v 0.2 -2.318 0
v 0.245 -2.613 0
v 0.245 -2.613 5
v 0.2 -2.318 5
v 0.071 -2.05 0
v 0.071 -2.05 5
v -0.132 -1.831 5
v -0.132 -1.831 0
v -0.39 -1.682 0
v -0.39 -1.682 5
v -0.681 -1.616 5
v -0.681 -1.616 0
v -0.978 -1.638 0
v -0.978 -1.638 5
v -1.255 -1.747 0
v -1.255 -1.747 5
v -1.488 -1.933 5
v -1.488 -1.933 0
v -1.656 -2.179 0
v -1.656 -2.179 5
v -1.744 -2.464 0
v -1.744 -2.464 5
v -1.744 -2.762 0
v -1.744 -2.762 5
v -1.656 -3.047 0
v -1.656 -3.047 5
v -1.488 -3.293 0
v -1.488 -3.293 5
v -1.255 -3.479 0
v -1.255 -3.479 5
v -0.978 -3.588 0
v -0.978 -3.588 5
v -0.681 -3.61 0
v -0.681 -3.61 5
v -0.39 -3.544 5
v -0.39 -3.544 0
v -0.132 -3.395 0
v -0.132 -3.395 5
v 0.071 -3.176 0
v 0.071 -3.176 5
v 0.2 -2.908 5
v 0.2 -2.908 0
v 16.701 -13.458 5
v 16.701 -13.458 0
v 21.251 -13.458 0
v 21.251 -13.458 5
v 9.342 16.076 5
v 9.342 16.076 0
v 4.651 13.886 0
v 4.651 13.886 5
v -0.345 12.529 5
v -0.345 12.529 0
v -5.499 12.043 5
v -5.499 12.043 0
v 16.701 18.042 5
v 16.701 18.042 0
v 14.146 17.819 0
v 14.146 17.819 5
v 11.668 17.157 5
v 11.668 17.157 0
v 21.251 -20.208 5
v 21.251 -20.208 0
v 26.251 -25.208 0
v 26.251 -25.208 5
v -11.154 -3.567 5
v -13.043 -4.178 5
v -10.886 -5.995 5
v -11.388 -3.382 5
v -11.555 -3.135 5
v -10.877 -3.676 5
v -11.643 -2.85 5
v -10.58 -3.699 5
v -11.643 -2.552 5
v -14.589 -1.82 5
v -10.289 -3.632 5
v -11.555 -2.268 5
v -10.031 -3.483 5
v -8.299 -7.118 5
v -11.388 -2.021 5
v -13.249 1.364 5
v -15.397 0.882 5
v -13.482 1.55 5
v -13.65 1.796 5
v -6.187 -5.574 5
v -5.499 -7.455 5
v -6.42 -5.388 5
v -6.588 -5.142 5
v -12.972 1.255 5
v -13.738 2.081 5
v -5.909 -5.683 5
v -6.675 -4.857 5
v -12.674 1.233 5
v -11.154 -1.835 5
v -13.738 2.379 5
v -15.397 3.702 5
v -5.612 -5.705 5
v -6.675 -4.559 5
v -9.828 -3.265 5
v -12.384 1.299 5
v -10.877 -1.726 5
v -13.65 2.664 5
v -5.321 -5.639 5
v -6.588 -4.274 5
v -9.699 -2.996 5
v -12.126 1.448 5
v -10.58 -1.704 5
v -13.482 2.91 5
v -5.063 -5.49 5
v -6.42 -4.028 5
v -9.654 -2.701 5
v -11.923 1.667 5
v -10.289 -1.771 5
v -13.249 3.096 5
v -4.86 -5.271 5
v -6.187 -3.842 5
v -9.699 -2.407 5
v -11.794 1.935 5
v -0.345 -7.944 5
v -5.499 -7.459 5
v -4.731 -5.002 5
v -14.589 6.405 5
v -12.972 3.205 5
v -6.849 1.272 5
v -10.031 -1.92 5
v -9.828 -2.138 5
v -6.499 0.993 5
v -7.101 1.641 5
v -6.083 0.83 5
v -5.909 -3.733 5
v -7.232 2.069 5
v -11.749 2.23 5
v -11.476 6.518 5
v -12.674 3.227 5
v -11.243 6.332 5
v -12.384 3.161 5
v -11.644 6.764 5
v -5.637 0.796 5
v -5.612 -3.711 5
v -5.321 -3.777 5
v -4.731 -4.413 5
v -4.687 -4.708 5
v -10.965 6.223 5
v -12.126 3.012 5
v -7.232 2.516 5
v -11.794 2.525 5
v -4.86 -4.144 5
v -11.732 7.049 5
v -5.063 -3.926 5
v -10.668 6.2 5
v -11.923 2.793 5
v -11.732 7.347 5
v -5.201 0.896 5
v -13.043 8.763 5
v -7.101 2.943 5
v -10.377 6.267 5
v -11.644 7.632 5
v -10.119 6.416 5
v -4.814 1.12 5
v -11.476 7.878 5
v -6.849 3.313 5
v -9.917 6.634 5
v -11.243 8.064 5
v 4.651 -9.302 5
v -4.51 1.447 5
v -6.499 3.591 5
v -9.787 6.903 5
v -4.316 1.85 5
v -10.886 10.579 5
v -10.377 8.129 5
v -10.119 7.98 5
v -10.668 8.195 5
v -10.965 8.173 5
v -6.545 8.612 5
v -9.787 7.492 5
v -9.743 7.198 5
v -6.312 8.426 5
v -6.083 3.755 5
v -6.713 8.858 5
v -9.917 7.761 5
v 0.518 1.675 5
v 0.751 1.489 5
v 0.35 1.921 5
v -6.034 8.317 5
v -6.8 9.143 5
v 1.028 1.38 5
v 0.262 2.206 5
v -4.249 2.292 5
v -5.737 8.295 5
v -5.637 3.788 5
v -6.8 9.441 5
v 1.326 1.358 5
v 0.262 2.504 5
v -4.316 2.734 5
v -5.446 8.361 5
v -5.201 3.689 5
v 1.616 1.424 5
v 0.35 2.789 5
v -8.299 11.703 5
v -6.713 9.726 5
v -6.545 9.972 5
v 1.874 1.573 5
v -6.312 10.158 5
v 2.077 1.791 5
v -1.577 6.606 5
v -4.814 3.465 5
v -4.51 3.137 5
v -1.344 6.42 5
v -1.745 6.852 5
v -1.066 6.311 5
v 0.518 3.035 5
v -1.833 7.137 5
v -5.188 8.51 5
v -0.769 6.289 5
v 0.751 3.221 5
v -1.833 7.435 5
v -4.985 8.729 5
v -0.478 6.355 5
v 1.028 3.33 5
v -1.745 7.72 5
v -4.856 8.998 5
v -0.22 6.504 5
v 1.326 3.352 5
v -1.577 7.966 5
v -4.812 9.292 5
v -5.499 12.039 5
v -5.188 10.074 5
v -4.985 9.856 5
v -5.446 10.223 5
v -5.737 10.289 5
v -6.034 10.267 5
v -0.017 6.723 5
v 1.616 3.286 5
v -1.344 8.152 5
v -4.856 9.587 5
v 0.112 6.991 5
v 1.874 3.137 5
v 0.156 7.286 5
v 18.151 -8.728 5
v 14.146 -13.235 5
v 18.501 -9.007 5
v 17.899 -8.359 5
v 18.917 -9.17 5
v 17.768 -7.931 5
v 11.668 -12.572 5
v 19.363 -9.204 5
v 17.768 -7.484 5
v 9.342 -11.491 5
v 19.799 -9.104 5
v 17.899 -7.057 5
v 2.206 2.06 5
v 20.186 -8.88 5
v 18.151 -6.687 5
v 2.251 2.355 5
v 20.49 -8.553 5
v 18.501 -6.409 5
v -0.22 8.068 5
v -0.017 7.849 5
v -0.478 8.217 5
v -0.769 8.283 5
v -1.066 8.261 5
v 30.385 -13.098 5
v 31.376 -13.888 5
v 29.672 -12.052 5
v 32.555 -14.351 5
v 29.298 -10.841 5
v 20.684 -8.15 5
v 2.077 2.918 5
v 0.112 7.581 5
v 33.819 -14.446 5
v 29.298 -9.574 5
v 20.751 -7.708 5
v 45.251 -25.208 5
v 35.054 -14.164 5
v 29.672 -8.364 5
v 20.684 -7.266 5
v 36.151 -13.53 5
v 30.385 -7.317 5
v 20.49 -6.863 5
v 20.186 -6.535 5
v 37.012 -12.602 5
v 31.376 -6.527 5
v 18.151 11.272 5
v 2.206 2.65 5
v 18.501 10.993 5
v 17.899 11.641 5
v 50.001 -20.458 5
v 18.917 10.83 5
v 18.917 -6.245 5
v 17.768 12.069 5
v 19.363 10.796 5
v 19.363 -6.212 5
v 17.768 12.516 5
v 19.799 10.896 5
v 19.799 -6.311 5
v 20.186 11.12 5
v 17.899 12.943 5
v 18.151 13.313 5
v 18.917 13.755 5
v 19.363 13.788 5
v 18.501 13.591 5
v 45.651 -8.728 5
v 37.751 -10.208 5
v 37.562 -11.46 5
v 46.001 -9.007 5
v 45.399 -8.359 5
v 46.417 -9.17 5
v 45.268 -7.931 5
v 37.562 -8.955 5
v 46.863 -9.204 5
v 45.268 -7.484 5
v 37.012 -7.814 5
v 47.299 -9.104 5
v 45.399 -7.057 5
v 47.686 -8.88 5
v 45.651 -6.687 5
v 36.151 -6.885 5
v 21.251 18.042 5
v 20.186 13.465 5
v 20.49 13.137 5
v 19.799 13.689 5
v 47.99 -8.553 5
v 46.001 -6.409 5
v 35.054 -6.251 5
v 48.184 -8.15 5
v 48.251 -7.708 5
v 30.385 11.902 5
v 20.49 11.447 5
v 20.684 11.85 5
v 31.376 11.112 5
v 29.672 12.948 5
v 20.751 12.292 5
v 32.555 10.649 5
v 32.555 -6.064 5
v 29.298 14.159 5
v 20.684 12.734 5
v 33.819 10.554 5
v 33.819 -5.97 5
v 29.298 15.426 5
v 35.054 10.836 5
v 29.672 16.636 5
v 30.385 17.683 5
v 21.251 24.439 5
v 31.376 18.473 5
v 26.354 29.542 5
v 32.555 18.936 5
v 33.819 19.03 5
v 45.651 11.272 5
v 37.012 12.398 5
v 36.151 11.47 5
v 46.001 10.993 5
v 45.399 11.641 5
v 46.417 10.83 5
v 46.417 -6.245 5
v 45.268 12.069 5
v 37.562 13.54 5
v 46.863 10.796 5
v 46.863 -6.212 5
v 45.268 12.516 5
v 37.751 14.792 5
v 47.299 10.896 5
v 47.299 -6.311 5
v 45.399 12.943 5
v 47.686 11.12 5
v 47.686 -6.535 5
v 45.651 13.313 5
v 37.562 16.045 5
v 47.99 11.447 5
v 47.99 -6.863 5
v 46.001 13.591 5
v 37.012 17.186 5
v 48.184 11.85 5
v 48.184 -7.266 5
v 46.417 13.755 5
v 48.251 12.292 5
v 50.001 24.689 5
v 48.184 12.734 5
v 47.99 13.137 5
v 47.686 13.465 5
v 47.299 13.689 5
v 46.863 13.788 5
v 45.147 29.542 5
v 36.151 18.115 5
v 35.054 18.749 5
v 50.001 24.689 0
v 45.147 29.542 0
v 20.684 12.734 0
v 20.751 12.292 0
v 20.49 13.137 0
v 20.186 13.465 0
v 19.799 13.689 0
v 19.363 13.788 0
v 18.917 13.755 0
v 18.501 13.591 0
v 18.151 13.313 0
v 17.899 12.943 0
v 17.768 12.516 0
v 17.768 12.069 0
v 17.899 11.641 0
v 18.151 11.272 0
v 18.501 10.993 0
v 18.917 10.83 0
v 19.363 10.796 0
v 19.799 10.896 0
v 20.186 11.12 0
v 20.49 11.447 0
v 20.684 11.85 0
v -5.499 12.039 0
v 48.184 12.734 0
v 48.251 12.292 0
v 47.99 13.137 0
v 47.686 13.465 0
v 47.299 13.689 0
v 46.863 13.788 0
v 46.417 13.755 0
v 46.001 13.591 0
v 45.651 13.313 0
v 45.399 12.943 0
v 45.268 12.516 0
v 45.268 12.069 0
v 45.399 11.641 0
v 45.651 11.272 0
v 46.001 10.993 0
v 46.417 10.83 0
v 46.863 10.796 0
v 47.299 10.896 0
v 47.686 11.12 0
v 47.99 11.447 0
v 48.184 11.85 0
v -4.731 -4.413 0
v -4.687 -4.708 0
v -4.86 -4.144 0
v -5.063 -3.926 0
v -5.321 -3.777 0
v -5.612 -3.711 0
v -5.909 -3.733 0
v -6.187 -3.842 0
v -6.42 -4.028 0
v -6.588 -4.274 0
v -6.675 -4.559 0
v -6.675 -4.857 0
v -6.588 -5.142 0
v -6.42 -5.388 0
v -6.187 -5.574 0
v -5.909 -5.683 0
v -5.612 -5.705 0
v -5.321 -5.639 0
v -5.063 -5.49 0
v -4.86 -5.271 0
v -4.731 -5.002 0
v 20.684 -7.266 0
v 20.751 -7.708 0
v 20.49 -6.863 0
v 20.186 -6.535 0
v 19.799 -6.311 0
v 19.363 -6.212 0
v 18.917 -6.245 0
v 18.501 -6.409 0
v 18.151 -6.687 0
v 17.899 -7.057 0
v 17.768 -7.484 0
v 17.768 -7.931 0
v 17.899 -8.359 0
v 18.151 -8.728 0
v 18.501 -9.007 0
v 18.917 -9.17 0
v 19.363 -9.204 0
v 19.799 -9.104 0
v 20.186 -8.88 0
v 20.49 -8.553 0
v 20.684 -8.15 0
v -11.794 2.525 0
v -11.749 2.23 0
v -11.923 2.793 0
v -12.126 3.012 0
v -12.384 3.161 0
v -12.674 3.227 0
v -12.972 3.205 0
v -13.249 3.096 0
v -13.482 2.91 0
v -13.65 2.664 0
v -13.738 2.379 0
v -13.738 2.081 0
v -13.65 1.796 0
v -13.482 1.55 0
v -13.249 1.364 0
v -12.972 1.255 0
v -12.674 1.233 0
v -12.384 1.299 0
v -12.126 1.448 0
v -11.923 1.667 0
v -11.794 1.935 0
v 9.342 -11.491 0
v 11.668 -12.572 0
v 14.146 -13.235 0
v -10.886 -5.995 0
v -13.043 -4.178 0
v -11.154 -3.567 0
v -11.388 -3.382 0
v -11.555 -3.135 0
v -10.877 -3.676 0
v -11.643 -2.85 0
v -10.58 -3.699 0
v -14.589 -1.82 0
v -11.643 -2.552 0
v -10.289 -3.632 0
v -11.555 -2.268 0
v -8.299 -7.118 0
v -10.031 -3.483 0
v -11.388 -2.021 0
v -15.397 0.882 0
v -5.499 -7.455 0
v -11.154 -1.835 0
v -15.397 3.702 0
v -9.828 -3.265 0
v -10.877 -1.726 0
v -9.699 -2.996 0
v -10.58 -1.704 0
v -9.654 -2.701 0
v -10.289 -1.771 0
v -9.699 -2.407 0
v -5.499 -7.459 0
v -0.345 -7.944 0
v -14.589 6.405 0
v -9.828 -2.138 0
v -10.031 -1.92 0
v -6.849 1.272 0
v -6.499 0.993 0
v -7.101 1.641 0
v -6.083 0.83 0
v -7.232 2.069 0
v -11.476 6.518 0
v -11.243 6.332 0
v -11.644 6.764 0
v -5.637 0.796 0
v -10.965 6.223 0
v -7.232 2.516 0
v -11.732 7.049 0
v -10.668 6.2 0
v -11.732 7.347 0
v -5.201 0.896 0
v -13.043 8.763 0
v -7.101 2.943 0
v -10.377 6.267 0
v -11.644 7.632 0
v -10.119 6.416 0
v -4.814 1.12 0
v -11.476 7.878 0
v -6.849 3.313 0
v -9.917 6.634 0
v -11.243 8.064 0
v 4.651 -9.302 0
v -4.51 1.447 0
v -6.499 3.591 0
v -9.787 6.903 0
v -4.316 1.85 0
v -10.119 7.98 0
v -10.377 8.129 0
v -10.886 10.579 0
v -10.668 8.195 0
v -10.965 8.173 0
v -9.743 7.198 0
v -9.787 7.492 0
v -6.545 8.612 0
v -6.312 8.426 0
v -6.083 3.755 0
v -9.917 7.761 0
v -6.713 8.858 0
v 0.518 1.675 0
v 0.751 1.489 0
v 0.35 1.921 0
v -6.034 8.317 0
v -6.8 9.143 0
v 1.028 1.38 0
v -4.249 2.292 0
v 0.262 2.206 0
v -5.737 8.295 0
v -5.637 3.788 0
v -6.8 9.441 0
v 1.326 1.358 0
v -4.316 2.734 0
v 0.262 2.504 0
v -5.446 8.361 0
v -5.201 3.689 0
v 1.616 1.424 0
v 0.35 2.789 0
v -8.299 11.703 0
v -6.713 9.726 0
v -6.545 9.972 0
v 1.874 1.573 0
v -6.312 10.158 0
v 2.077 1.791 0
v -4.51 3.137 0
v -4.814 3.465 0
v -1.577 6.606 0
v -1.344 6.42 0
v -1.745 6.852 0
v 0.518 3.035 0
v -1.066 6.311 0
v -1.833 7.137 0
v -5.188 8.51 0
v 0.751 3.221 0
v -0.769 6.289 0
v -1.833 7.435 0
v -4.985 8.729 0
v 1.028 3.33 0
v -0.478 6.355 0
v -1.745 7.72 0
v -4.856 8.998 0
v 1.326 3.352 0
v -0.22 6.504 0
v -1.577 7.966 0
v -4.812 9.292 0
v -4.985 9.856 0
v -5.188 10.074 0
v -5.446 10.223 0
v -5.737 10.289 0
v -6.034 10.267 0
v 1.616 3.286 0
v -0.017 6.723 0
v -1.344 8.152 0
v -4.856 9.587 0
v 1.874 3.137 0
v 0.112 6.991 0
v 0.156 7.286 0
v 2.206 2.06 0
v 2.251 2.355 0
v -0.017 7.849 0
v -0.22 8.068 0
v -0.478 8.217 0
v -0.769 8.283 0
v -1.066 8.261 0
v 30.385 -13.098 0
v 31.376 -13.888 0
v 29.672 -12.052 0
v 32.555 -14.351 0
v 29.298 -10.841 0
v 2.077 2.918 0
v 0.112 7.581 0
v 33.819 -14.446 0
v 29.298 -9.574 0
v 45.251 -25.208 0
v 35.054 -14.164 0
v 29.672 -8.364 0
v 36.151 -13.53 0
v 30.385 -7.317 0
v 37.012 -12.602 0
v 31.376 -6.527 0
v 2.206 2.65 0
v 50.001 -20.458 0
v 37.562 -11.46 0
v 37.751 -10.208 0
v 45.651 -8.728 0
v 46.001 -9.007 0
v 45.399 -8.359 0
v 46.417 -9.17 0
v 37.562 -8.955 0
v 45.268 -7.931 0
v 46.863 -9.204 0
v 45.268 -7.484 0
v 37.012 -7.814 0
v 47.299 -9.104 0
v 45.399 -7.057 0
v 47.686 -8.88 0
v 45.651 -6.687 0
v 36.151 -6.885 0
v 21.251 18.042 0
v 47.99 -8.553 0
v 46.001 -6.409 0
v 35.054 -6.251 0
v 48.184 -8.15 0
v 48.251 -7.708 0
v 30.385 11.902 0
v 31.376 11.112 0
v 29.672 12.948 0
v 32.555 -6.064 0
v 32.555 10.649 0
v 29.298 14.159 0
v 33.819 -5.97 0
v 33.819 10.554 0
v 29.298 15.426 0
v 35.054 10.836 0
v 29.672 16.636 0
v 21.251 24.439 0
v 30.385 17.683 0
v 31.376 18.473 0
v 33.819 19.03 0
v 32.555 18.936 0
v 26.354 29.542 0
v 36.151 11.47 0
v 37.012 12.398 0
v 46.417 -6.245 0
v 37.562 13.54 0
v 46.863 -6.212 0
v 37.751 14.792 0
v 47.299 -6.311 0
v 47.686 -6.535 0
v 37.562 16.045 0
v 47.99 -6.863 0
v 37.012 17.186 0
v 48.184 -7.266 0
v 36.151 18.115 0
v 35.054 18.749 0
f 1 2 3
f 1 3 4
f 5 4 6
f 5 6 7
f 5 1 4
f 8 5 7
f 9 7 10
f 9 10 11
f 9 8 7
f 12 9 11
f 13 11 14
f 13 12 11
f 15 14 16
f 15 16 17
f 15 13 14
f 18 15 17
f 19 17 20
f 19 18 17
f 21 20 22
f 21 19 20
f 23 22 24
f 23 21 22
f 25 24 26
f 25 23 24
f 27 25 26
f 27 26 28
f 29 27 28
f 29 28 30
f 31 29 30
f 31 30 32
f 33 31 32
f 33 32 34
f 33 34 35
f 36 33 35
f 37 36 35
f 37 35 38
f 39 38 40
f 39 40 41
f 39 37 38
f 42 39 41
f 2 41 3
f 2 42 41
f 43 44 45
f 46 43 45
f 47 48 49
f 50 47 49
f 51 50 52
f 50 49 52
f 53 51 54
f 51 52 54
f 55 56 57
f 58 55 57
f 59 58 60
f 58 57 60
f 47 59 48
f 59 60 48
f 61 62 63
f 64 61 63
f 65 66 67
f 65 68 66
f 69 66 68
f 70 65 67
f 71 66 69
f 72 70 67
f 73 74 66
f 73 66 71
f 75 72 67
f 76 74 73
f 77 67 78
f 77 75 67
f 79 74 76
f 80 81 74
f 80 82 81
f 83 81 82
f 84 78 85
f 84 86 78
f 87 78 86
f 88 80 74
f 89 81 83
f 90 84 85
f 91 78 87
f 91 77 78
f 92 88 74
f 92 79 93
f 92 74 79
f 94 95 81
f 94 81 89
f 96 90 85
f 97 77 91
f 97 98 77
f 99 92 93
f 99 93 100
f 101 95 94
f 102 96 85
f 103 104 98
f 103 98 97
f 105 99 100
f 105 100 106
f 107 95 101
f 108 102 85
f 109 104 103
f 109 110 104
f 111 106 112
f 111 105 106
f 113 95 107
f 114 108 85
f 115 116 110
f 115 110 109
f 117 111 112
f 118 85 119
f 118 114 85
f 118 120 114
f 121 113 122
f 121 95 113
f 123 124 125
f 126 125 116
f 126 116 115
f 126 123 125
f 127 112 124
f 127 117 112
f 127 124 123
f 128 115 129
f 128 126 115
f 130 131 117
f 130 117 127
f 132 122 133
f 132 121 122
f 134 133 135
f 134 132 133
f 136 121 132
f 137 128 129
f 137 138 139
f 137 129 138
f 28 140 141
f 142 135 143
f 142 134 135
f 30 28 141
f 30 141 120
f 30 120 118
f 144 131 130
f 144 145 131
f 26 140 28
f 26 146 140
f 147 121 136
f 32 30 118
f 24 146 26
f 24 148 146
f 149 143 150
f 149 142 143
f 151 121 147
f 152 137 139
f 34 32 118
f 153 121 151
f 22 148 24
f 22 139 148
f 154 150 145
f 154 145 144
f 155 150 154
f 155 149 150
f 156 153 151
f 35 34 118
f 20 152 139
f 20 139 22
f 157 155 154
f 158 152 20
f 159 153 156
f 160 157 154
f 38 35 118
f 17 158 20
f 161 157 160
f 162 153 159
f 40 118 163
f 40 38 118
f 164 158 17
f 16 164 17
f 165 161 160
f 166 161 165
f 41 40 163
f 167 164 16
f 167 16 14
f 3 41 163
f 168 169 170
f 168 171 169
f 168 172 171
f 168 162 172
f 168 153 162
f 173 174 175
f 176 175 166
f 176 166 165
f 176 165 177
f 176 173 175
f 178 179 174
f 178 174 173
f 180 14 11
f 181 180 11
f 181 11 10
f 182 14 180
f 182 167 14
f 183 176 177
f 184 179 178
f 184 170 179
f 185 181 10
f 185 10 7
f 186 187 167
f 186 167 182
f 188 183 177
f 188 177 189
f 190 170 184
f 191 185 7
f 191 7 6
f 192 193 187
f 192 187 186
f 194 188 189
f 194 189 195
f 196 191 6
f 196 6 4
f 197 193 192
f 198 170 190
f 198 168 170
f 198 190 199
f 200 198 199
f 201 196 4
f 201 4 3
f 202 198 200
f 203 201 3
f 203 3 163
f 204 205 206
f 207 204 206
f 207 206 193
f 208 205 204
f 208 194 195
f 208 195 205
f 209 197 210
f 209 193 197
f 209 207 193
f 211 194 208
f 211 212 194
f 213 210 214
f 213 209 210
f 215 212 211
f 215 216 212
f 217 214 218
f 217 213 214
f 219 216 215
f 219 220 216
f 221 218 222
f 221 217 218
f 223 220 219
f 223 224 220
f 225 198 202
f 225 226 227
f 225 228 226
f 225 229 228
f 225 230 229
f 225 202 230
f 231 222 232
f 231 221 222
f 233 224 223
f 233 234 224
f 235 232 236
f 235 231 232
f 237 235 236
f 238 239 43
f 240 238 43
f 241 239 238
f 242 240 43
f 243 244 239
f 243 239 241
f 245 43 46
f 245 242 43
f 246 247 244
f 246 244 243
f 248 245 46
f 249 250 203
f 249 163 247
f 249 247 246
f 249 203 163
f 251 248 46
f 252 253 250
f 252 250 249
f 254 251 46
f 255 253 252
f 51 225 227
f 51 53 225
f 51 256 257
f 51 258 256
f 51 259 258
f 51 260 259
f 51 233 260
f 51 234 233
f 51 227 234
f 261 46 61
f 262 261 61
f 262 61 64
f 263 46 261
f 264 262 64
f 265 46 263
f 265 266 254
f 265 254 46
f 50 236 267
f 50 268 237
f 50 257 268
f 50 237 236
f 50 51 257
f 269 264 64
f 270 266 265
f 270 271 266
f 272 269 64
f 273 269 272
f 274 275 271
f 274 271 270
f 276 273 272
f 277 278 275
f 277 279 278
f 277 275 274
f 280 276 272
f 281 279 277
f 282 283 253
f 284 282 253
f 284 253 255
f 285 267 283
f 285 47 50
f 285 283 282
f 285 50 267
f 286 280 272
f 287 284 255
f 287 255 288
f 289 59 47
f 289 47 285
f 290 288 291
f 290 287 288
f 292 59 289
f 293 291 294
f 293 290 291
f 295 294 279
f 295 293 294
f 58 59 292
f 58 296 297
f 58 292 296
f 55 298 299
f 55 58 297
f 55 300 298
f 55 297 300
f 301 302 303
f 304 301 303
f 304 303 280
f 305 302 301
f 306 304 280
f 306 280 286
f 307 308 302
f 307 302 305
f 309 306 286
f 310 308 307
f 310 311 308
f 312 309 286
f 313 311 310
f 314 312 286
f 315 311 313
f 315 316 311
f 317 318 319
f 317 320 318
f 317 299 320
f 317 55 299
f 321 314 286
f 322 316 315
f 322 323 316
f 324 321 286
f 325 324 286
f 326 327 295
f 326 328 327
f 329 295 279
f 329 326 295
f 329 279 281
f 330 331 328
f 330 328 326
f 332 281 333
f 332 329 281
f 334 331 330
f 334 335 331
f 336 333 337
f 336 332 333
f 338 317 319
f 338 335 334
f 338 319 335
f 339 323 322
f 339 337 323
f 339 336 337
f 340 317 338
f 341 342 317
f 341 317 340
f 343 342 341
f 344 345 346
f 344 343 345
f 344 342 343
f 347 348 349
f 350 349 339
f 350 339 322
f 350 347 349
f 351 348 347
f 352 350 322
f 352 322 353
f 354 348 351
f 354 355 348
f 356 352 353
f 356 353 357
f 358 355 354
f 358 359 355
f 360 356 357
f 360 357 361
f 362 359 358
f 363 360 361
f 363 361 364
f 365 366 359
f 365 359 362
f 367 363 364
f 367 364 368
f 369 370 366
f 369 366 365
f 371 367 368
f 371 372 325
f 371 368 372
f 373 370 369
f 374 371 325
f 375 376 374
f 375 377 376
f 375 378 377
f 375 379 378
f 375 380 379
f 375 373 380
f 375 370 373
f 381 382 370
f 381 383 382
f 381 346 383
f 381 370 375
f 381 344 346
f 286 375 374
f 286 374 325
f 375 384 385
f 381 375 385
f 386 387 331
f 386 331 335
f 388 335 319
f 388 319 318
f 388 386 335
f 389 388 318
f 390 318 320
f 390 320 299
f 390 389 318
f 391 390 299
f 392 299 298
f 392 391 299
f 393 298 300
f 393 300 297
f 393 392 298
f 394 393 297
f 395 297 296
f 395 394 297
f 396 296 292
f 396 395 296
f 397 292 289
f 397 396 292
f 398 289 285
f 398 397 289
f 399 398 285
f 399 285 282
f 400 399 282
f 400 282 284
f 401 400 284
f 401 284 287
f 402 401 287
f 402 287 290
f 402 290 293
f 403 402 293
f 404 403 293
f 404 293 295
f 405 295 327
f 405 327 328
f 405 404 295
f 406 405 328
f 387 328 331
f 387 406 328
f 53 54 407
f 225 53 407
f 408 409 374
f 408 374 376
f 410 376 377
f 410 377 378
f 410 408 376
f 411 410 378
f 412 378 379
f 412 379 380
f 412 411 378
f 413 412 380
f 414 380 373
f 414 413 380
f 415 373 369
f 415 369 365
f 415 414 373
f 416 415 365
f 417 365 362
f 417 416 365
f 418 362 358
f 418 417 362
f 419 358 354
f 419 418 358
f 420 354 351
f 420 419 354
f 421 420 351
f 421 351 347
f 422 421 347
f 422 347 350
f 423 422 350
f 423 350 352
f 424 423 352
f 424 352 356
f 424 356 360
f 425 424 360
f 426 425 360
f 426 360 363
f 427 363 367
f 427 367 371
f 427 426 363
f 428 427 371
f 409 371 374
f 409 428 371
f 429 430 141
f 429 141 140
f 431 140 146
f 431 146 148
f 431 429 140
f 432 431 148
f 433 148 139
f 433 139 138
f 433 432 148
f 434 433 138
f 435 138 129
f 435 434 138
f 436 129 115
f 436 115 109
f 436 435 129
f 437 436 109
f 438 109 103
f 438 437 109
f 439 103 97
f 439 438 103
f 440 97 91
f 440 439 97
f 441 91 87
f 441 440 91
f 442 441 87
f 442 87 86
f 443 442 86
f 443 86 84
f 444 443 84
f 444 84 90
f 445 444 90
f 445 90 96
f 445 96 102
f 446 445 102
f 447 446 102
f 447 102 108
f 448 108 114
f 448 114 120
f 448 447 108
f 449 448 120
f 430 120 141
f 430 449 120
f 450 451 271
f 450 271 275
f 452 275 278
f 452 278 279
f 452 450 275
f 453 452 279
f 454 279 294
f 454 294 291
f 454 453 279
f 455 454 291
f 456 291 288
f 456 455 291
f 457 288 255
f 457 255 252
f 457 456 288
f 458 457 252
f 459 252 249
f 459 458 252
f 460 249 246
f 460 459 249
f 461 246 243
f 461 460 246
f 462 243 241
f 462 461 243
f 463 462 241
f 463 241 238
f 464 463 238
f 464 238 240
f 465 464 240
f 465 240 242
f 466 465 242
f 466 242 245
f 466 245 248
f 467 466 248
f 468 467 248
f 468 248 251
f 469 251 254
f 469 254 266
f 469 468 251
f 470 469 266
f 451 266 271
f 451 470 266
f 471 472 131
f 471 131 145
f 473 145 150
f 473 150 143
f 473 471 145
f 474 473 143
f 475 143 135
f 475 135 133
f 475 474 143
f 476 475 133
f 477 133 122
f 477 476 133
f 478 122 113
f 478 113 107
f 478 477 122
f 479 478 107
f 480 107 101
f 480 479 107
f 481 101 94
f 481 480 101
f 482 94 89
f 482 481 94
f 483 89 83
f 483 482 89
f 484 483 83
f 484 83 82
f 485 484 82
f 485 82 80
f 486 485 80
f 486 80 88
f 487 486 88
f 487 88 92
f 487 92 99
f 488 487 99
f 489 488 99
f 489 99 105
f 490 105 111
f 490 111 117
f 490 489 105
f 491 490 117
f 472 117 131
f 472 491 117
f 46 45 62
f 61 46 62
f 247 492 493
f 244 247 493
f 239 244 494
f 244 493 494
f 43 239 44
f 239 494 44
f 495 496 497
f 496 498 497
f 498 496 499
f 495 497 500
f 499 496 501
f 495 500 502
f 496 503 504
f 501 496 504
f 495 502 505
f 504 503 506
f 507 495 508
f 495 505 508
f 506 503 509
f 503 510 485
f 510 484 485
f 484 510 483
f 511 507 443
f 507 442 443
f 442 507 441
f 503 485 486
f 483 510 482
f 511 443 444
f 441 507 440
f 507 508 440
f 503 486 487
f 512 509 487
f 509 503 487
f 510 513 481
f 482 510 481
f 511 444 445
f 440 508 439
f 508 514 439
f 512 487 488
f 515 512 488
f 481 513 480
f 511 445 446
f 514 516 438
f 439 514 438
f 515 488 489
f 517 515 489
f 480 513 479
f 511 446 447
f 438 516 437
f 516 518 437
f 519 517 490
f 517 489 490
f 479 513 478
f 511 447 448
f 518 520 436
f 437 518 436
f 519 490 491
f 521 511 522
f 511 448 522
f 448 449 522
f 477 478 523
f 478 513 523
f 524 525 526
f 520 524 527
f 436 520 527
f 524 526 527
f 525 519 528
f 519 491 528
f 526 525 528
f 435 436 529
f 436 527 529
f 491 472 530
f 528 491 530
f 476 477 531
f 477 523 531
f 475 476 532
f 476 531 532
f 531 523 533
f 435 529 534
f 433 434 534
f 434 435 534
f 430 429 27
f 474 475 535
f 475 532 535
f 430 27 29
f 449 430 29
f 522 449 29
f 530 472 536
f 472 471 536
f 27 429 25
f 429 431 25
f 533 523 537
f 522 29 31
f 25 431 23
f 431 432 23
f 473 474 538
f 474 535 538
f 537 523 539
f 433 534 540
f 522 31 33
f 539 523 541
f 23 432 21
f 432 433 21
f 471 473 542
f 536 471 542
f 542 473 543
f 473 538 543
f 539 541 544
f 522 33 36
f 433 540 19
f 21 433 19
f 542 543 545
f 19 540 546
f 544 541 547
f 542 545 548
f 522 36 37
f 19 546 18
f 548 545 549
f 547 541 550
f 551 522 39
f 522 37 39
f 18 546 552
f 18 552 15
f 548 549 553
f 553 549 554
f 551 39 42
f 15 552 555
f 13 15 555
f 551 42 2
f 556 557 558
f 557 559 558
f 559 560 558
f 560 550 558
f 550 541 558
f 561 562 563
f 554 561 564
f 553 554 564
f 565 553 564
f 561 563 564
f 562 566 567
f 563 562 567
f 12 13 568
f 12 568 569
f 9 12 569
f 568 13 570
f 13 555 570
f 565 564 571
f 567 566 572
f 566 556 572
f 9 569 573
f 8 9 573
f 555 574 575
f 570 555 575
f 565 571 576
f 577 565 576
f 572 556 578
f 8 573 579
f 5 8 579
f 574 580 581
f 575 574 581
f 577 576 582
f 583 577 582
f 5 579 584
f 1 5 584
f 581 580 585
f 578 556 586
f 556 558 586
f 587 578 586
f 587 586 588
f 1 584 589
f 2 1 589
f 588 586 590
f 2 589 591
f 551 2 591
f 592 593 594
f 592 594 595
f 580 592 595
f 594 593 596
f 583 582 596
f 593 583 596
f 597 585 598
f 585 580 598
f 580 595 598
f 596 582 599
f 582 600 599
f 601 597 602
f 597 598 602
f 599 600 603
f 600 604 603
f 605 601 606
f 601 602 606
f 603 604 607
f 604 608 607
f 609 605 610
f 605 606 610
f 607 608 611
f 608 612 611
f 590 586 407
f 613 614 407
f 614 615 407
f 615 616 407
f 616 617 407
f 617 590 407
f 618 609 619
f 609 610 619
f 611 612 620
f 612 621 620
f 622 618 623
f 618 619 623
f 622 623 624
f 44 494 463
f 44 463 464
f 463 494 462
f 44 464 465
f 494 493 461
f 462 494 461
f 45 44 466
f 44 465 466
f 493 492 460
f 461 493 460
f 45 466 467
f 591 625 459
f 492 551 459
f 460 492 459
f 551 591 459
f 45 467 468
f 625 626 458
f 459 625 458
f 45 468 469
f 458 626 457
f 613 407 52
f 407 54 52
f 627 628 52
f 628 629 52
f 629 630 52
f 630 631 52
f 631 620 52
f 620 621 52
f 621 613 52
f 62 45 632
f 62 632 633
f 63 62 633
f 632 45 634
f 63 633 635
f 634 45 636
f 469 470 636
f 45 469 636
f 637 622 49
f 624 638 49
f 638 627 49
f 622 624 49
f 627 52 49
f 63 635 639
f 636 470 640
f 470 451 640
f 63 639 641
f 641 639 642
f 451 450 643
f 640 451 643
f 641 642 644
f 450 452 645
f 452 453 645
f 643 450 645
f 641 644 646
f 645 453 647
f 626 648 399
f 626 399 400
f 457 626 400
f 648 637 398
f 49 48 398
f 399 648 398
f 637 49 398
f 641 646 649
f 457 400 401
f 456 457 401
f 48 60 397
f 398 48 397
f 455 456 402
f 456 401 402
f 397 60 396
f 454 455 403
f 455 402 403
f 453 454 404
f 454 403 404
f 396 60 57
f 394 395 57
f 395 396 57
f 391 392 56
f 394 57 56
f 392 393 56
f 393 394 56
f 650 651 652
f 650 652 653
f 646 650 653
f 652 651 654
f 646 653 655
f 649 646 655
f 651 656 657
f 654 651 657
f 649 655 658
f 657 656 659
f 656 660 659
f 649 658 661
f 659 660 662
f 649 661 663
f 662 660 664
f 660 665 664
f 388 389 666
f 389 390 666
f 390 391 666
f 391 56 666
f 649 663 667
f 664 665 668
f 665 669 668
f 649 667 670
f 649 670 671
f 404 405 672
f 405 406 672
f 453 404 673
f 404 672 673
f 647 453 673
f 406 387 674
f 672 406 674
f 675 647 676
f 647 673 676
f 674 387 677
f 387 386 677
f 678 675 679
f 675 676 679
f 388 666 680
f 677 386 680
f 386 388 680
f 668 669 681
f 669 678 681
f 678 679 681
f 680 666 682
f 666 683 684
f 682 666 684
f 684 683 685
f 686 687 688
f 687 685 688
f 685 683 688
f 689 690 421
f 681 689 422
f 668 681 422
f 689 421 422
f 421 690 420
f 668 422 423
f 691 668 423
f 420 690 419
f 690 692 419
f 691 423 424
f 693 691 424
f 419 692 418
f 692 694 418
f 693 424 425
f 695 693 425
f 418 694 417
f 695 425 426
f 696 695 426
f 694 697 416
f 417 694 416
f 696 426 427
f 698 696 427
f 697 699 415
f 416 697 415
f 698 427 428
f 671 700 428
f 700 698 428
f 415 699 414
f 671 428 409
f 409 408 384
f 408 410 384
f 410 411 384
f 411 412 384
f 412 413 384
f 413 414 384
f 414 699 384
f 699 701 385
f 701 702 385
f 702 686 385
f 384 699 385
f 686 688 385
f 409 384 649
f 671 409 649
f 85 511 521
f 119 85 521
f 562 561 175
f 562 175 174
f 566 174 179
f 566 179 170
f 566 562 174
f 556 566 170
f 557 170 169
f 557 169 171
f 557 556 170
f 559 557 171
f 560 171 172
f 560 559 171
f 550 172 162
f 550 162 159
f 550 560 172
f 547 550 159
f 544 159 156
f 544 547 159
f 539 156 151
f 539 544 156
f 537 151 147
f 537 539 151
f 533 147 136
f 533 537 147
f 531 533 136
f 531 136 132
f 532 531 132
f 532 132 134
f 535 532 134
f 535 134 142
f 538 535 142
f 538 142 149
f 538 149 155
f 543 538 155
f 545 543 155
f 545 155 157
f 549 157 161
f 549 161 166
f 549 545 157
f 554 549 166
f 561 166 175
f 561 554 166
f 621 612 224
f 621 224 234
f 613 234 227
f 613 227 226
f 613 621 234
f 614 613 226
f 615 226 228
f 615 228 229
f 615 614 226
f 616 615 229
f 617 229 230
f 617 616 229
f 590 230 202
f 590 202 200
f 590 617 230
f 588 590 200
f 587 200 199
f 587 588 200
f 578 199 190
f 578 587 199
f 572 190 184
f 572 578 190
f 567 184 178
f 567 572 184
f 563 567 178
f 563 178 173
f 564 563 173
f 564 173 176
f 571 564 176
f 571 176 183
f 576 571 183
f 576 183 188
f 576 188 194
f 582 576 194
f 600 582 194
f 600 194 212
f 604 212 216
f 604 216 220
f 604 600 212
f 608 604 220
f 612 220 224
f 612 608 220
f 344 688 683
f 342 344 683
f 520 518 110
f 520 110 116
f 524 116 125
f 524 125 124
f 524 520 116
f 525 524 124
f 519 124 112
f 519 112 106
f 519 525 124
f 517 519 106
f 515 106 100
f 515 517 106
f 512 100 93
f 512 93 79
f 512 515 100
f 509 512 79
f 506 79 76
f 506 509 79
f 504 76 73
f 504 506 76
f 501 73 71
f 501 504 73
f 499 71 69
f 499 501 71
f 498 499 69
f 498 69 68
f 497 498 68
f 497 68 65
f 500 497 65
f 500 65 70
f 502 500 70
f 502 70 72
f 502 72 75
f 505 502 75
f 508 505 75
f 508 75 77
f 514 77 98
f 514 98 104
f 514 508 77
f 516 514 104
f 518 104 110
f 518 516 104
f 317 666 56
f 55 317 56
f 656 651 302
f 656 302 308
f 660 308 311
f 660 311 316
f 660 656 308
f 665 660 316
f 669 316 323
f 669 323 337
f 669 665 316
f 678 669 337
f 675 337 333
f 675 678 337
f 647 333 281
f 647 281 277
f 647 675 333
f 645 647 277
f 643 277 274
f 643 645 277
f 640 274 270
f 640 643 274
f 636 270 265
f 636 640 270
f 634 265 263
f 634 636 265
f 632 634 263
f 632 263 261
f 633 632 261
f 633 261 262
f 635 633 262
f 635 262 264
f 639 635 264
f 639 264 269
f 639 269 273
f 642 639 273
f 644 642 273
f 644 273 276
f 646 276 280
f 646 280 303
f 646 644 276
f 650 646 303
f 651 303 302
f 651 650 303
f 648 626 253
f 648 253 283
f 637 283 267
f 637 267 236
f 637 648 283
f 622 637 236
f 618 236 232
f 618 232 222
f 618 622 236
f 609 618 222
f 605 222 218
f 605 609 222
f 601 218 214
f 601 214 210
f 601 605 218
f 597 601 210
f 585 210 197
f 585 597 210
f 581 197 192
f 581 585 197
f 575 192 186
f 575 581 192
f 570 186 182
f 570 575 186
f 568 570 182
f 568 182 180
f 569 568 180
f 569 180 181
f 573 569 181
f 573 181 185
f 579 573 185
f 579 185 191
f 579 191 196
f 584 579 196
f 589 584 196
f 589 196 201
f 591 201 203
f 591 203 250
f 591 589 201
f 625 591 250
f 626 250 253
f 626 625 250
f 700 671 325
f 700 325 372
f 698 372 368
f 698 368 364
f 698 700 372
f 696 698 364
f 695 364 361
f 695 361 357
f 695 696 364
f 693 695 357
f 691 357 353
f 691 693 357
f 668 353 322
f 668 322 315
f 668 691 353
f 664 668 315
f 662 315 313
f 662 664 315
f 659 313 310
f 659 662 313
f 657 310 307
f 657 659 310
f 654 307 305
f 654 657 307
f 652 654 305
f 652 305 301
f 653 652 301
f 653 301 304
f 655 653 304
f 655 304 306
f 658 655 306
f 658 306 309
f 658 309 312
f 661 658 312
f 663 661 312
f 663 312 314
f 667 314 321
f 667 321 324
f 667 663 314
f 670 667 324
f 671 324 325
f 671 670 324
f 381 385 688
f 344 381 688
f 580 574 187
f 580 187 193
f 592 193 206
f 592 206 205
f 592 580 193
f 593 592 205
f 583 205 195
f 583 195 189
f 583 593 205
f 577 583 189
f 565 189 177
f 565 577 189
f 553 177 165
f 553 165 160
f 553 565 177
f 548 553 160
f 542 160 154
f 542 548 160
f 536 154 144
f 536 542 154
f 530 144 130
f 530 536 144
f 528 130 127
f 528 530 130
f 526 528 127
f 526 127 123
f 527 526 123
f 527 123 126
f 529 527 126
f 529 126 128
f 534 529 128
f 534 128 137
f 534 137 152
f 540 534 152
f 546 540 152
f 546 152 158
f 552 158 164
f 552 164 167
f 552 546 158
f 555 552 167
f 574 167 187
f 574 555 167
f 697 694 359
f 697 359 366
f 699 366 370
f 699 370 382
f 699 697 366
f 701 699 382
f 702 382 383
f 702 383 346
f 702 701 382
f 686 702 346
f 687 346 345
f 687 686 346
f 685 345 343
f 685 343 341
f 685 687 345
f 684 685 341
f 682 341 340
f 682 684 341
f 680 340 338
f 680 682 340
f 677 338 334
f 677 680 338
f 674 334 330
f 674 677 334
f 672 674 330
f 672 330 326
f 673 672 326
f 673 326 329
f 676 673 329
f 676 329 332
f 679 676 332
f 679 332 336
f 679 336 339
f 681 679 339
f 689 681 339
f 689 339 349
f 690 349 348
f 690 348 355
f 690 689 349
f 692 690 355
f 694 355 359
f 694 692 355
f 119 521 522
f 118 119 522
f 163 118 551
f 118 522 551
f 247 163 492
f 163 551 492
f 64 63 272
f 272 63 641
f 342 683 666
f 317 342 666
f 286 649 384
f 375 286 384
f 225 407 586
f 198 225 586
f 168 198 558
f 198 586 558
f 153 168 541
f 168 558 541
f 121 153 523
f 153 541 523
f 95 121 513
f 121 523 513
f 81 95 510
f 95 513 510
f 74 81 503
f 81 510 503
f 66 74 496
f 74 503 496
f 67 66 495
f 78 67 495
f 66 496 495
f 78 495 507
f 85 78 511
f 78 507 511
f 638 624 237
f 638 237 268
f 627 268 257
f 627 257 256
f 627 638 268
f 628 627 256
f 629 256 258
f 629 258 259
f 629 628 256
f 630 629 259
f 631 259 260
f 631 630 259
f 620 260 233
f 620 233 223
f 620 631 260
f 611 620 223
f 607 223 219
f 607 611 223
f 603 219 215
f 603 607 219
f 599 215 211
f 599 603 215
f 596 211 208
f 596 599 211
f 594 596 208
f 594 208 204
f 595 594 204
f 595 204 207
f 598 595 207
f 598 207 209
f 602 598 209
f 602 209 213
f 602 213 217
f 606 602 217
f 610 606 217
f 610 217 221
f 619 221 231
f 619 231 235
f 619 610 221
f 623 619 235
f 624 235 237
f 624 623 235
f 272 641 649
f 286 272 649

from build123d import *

# Parameters (mm, degrees)
SKETCH1_R           = 1.5
SKETCH1_R_2         = 4.25
SKETCH1_R_3         = 1
BOSS_EXTRUDE2_DEPTH = 5


with BuildPart() as part:
    # Sketch1 → Boss-Extrude2 (new body)
    with BuildSketch(Plane.XY):
        with BuildLine():
            Line((45.25091594, -25.207708346), (50.00091594, -20.457708346))
            Line((50.00091594, -20.457708346), (50.00091594, 24.688738263))
            Line((50.00091594, 24.688738263), (45.147362549, 29.542291654))
            Line((45.147362549, 29.542291654), (26.35446933, 29.542291654))
            Line((26.35446933, 29.542291654), (21.25091594, 24.438738263))
            Line((21.25091594, 24.438738263), (21.25091594, 18.042291654))
            Line((21.25091594, 18.042291654), (20.408095363, 18.042291654))
            Line((20.408095363, 18.042291654), (16.70086026, 18.042291654))
            ThreePointArc((16.70086026, 18.042291654), (12.892426636, 17.542145454), (9.3422674, 16.075624987))
            ThreePointArc((9.3422674, 16.075624987), (2.182128173, 13.100539865), (-5.49908406, 12.043324729))
            Line((-5.49908406, 12.043324729), (-5.49908406, 12.039085999))
            ThreePointArc((-5.49908406, 12.039085999), (-15.49908406, 2.292291654), (-5.49908406, -7.454502691))
            Line((-5.49908406, -7.454502691), (-5.49908406, -7.458741422))
            ThreePointArc((-5.49908406, -7.458741422), (2.182128173, -8.515956557), (9.3422674, -11.491041679))
            ThreePointArc((9.3422674, -11.491041679), (12.892426636, -12.957562146), (16.70086026, -13.457708346))
            Line((16.70086026, -13.457708346), (20.408095363, -13.457708346))
            Line((20.408095363, -13.457708346), (21.25091594, -13.457708346))
            Line((21.25091594, -13.457708346), (21.25091594, -20.207708346))
            Line((21.25091594, -20.207708346), (26.25091594, -25.207708346))
            Line((26.25091594, -25.207708346), (45.25091594, -25.207708346))
        make_face()
        with Locations((46.75091594, -7.707708346)):
            Circle(SKETCH1_R, mode=Mode.SUBTRACT)
        with Locations((46.75091594, 12.292291654)):
            Circle(SKETCH1_R, mode=Mode.SUBTRACT)
        with Locations((33.50091594, 14.792291654)):
            Circle(SKETCH1_R_2, mode=Mode.SUBTRACT)
        with Locations((33.50091594, -10.207708346)):
            Circle(SKETCH1_R_2, mode=Mode.SUBTRACT)
        with Locations((19.25091594, 12.292291654)):
            Circle(SKETCH1_R, mode=Mode.SUBTRACT)
        with Locations((19.25091594, -7.707708346)):
            Circle(SKETCH1_R, mode=Mode.SUBTRACT)
        with Locations((-5.74908406, 2.292291654)):
            Circle(SKETCH1_R, mode=Mode.SUBTRACT)
        with Locations((1.25091594, 2.354746229)):
            Circle(SKETCH1_R_3, mode=Mode.SUBTRACT)
        with Locations((-0.755373293, -2.613098521)):
            Circle(SKETCH1_R_3, mode=Mode.SUBTRACT)
        with Locations((-5.686629485, -4.707708346)):
            Circle(SKETCH1_R_3, mode=Mode.SUBTRACT)
        with Locations((-10.654474236, -2.701419114)):
            Circle(SKETCH1_R_3, mode=Mode.SUBTRACT)
        with Locations((-12.74908406, 2.229837079)):
            Circle(SKETCH1_R_3, mode=Mode.SUBTRACT)
        with Locations((-10.742794828, 7.197681829)):
            Circle(SKETCH1_R_3, mode=Mode.SUBTRACT)
        with Locations((-5.811538636, 9.292291654)):
            Circle(SKETCH1_R_3, mode=Mode.SUBTRACT)
        with Locations((-0.843693885, 7.286002421)):
            Circle(SKETCH1_R_3, mode=Mode.SUBTRACT)
    extrude(amount=BOSS_EXTRUDE2_DEPTH)


solid = part.part
